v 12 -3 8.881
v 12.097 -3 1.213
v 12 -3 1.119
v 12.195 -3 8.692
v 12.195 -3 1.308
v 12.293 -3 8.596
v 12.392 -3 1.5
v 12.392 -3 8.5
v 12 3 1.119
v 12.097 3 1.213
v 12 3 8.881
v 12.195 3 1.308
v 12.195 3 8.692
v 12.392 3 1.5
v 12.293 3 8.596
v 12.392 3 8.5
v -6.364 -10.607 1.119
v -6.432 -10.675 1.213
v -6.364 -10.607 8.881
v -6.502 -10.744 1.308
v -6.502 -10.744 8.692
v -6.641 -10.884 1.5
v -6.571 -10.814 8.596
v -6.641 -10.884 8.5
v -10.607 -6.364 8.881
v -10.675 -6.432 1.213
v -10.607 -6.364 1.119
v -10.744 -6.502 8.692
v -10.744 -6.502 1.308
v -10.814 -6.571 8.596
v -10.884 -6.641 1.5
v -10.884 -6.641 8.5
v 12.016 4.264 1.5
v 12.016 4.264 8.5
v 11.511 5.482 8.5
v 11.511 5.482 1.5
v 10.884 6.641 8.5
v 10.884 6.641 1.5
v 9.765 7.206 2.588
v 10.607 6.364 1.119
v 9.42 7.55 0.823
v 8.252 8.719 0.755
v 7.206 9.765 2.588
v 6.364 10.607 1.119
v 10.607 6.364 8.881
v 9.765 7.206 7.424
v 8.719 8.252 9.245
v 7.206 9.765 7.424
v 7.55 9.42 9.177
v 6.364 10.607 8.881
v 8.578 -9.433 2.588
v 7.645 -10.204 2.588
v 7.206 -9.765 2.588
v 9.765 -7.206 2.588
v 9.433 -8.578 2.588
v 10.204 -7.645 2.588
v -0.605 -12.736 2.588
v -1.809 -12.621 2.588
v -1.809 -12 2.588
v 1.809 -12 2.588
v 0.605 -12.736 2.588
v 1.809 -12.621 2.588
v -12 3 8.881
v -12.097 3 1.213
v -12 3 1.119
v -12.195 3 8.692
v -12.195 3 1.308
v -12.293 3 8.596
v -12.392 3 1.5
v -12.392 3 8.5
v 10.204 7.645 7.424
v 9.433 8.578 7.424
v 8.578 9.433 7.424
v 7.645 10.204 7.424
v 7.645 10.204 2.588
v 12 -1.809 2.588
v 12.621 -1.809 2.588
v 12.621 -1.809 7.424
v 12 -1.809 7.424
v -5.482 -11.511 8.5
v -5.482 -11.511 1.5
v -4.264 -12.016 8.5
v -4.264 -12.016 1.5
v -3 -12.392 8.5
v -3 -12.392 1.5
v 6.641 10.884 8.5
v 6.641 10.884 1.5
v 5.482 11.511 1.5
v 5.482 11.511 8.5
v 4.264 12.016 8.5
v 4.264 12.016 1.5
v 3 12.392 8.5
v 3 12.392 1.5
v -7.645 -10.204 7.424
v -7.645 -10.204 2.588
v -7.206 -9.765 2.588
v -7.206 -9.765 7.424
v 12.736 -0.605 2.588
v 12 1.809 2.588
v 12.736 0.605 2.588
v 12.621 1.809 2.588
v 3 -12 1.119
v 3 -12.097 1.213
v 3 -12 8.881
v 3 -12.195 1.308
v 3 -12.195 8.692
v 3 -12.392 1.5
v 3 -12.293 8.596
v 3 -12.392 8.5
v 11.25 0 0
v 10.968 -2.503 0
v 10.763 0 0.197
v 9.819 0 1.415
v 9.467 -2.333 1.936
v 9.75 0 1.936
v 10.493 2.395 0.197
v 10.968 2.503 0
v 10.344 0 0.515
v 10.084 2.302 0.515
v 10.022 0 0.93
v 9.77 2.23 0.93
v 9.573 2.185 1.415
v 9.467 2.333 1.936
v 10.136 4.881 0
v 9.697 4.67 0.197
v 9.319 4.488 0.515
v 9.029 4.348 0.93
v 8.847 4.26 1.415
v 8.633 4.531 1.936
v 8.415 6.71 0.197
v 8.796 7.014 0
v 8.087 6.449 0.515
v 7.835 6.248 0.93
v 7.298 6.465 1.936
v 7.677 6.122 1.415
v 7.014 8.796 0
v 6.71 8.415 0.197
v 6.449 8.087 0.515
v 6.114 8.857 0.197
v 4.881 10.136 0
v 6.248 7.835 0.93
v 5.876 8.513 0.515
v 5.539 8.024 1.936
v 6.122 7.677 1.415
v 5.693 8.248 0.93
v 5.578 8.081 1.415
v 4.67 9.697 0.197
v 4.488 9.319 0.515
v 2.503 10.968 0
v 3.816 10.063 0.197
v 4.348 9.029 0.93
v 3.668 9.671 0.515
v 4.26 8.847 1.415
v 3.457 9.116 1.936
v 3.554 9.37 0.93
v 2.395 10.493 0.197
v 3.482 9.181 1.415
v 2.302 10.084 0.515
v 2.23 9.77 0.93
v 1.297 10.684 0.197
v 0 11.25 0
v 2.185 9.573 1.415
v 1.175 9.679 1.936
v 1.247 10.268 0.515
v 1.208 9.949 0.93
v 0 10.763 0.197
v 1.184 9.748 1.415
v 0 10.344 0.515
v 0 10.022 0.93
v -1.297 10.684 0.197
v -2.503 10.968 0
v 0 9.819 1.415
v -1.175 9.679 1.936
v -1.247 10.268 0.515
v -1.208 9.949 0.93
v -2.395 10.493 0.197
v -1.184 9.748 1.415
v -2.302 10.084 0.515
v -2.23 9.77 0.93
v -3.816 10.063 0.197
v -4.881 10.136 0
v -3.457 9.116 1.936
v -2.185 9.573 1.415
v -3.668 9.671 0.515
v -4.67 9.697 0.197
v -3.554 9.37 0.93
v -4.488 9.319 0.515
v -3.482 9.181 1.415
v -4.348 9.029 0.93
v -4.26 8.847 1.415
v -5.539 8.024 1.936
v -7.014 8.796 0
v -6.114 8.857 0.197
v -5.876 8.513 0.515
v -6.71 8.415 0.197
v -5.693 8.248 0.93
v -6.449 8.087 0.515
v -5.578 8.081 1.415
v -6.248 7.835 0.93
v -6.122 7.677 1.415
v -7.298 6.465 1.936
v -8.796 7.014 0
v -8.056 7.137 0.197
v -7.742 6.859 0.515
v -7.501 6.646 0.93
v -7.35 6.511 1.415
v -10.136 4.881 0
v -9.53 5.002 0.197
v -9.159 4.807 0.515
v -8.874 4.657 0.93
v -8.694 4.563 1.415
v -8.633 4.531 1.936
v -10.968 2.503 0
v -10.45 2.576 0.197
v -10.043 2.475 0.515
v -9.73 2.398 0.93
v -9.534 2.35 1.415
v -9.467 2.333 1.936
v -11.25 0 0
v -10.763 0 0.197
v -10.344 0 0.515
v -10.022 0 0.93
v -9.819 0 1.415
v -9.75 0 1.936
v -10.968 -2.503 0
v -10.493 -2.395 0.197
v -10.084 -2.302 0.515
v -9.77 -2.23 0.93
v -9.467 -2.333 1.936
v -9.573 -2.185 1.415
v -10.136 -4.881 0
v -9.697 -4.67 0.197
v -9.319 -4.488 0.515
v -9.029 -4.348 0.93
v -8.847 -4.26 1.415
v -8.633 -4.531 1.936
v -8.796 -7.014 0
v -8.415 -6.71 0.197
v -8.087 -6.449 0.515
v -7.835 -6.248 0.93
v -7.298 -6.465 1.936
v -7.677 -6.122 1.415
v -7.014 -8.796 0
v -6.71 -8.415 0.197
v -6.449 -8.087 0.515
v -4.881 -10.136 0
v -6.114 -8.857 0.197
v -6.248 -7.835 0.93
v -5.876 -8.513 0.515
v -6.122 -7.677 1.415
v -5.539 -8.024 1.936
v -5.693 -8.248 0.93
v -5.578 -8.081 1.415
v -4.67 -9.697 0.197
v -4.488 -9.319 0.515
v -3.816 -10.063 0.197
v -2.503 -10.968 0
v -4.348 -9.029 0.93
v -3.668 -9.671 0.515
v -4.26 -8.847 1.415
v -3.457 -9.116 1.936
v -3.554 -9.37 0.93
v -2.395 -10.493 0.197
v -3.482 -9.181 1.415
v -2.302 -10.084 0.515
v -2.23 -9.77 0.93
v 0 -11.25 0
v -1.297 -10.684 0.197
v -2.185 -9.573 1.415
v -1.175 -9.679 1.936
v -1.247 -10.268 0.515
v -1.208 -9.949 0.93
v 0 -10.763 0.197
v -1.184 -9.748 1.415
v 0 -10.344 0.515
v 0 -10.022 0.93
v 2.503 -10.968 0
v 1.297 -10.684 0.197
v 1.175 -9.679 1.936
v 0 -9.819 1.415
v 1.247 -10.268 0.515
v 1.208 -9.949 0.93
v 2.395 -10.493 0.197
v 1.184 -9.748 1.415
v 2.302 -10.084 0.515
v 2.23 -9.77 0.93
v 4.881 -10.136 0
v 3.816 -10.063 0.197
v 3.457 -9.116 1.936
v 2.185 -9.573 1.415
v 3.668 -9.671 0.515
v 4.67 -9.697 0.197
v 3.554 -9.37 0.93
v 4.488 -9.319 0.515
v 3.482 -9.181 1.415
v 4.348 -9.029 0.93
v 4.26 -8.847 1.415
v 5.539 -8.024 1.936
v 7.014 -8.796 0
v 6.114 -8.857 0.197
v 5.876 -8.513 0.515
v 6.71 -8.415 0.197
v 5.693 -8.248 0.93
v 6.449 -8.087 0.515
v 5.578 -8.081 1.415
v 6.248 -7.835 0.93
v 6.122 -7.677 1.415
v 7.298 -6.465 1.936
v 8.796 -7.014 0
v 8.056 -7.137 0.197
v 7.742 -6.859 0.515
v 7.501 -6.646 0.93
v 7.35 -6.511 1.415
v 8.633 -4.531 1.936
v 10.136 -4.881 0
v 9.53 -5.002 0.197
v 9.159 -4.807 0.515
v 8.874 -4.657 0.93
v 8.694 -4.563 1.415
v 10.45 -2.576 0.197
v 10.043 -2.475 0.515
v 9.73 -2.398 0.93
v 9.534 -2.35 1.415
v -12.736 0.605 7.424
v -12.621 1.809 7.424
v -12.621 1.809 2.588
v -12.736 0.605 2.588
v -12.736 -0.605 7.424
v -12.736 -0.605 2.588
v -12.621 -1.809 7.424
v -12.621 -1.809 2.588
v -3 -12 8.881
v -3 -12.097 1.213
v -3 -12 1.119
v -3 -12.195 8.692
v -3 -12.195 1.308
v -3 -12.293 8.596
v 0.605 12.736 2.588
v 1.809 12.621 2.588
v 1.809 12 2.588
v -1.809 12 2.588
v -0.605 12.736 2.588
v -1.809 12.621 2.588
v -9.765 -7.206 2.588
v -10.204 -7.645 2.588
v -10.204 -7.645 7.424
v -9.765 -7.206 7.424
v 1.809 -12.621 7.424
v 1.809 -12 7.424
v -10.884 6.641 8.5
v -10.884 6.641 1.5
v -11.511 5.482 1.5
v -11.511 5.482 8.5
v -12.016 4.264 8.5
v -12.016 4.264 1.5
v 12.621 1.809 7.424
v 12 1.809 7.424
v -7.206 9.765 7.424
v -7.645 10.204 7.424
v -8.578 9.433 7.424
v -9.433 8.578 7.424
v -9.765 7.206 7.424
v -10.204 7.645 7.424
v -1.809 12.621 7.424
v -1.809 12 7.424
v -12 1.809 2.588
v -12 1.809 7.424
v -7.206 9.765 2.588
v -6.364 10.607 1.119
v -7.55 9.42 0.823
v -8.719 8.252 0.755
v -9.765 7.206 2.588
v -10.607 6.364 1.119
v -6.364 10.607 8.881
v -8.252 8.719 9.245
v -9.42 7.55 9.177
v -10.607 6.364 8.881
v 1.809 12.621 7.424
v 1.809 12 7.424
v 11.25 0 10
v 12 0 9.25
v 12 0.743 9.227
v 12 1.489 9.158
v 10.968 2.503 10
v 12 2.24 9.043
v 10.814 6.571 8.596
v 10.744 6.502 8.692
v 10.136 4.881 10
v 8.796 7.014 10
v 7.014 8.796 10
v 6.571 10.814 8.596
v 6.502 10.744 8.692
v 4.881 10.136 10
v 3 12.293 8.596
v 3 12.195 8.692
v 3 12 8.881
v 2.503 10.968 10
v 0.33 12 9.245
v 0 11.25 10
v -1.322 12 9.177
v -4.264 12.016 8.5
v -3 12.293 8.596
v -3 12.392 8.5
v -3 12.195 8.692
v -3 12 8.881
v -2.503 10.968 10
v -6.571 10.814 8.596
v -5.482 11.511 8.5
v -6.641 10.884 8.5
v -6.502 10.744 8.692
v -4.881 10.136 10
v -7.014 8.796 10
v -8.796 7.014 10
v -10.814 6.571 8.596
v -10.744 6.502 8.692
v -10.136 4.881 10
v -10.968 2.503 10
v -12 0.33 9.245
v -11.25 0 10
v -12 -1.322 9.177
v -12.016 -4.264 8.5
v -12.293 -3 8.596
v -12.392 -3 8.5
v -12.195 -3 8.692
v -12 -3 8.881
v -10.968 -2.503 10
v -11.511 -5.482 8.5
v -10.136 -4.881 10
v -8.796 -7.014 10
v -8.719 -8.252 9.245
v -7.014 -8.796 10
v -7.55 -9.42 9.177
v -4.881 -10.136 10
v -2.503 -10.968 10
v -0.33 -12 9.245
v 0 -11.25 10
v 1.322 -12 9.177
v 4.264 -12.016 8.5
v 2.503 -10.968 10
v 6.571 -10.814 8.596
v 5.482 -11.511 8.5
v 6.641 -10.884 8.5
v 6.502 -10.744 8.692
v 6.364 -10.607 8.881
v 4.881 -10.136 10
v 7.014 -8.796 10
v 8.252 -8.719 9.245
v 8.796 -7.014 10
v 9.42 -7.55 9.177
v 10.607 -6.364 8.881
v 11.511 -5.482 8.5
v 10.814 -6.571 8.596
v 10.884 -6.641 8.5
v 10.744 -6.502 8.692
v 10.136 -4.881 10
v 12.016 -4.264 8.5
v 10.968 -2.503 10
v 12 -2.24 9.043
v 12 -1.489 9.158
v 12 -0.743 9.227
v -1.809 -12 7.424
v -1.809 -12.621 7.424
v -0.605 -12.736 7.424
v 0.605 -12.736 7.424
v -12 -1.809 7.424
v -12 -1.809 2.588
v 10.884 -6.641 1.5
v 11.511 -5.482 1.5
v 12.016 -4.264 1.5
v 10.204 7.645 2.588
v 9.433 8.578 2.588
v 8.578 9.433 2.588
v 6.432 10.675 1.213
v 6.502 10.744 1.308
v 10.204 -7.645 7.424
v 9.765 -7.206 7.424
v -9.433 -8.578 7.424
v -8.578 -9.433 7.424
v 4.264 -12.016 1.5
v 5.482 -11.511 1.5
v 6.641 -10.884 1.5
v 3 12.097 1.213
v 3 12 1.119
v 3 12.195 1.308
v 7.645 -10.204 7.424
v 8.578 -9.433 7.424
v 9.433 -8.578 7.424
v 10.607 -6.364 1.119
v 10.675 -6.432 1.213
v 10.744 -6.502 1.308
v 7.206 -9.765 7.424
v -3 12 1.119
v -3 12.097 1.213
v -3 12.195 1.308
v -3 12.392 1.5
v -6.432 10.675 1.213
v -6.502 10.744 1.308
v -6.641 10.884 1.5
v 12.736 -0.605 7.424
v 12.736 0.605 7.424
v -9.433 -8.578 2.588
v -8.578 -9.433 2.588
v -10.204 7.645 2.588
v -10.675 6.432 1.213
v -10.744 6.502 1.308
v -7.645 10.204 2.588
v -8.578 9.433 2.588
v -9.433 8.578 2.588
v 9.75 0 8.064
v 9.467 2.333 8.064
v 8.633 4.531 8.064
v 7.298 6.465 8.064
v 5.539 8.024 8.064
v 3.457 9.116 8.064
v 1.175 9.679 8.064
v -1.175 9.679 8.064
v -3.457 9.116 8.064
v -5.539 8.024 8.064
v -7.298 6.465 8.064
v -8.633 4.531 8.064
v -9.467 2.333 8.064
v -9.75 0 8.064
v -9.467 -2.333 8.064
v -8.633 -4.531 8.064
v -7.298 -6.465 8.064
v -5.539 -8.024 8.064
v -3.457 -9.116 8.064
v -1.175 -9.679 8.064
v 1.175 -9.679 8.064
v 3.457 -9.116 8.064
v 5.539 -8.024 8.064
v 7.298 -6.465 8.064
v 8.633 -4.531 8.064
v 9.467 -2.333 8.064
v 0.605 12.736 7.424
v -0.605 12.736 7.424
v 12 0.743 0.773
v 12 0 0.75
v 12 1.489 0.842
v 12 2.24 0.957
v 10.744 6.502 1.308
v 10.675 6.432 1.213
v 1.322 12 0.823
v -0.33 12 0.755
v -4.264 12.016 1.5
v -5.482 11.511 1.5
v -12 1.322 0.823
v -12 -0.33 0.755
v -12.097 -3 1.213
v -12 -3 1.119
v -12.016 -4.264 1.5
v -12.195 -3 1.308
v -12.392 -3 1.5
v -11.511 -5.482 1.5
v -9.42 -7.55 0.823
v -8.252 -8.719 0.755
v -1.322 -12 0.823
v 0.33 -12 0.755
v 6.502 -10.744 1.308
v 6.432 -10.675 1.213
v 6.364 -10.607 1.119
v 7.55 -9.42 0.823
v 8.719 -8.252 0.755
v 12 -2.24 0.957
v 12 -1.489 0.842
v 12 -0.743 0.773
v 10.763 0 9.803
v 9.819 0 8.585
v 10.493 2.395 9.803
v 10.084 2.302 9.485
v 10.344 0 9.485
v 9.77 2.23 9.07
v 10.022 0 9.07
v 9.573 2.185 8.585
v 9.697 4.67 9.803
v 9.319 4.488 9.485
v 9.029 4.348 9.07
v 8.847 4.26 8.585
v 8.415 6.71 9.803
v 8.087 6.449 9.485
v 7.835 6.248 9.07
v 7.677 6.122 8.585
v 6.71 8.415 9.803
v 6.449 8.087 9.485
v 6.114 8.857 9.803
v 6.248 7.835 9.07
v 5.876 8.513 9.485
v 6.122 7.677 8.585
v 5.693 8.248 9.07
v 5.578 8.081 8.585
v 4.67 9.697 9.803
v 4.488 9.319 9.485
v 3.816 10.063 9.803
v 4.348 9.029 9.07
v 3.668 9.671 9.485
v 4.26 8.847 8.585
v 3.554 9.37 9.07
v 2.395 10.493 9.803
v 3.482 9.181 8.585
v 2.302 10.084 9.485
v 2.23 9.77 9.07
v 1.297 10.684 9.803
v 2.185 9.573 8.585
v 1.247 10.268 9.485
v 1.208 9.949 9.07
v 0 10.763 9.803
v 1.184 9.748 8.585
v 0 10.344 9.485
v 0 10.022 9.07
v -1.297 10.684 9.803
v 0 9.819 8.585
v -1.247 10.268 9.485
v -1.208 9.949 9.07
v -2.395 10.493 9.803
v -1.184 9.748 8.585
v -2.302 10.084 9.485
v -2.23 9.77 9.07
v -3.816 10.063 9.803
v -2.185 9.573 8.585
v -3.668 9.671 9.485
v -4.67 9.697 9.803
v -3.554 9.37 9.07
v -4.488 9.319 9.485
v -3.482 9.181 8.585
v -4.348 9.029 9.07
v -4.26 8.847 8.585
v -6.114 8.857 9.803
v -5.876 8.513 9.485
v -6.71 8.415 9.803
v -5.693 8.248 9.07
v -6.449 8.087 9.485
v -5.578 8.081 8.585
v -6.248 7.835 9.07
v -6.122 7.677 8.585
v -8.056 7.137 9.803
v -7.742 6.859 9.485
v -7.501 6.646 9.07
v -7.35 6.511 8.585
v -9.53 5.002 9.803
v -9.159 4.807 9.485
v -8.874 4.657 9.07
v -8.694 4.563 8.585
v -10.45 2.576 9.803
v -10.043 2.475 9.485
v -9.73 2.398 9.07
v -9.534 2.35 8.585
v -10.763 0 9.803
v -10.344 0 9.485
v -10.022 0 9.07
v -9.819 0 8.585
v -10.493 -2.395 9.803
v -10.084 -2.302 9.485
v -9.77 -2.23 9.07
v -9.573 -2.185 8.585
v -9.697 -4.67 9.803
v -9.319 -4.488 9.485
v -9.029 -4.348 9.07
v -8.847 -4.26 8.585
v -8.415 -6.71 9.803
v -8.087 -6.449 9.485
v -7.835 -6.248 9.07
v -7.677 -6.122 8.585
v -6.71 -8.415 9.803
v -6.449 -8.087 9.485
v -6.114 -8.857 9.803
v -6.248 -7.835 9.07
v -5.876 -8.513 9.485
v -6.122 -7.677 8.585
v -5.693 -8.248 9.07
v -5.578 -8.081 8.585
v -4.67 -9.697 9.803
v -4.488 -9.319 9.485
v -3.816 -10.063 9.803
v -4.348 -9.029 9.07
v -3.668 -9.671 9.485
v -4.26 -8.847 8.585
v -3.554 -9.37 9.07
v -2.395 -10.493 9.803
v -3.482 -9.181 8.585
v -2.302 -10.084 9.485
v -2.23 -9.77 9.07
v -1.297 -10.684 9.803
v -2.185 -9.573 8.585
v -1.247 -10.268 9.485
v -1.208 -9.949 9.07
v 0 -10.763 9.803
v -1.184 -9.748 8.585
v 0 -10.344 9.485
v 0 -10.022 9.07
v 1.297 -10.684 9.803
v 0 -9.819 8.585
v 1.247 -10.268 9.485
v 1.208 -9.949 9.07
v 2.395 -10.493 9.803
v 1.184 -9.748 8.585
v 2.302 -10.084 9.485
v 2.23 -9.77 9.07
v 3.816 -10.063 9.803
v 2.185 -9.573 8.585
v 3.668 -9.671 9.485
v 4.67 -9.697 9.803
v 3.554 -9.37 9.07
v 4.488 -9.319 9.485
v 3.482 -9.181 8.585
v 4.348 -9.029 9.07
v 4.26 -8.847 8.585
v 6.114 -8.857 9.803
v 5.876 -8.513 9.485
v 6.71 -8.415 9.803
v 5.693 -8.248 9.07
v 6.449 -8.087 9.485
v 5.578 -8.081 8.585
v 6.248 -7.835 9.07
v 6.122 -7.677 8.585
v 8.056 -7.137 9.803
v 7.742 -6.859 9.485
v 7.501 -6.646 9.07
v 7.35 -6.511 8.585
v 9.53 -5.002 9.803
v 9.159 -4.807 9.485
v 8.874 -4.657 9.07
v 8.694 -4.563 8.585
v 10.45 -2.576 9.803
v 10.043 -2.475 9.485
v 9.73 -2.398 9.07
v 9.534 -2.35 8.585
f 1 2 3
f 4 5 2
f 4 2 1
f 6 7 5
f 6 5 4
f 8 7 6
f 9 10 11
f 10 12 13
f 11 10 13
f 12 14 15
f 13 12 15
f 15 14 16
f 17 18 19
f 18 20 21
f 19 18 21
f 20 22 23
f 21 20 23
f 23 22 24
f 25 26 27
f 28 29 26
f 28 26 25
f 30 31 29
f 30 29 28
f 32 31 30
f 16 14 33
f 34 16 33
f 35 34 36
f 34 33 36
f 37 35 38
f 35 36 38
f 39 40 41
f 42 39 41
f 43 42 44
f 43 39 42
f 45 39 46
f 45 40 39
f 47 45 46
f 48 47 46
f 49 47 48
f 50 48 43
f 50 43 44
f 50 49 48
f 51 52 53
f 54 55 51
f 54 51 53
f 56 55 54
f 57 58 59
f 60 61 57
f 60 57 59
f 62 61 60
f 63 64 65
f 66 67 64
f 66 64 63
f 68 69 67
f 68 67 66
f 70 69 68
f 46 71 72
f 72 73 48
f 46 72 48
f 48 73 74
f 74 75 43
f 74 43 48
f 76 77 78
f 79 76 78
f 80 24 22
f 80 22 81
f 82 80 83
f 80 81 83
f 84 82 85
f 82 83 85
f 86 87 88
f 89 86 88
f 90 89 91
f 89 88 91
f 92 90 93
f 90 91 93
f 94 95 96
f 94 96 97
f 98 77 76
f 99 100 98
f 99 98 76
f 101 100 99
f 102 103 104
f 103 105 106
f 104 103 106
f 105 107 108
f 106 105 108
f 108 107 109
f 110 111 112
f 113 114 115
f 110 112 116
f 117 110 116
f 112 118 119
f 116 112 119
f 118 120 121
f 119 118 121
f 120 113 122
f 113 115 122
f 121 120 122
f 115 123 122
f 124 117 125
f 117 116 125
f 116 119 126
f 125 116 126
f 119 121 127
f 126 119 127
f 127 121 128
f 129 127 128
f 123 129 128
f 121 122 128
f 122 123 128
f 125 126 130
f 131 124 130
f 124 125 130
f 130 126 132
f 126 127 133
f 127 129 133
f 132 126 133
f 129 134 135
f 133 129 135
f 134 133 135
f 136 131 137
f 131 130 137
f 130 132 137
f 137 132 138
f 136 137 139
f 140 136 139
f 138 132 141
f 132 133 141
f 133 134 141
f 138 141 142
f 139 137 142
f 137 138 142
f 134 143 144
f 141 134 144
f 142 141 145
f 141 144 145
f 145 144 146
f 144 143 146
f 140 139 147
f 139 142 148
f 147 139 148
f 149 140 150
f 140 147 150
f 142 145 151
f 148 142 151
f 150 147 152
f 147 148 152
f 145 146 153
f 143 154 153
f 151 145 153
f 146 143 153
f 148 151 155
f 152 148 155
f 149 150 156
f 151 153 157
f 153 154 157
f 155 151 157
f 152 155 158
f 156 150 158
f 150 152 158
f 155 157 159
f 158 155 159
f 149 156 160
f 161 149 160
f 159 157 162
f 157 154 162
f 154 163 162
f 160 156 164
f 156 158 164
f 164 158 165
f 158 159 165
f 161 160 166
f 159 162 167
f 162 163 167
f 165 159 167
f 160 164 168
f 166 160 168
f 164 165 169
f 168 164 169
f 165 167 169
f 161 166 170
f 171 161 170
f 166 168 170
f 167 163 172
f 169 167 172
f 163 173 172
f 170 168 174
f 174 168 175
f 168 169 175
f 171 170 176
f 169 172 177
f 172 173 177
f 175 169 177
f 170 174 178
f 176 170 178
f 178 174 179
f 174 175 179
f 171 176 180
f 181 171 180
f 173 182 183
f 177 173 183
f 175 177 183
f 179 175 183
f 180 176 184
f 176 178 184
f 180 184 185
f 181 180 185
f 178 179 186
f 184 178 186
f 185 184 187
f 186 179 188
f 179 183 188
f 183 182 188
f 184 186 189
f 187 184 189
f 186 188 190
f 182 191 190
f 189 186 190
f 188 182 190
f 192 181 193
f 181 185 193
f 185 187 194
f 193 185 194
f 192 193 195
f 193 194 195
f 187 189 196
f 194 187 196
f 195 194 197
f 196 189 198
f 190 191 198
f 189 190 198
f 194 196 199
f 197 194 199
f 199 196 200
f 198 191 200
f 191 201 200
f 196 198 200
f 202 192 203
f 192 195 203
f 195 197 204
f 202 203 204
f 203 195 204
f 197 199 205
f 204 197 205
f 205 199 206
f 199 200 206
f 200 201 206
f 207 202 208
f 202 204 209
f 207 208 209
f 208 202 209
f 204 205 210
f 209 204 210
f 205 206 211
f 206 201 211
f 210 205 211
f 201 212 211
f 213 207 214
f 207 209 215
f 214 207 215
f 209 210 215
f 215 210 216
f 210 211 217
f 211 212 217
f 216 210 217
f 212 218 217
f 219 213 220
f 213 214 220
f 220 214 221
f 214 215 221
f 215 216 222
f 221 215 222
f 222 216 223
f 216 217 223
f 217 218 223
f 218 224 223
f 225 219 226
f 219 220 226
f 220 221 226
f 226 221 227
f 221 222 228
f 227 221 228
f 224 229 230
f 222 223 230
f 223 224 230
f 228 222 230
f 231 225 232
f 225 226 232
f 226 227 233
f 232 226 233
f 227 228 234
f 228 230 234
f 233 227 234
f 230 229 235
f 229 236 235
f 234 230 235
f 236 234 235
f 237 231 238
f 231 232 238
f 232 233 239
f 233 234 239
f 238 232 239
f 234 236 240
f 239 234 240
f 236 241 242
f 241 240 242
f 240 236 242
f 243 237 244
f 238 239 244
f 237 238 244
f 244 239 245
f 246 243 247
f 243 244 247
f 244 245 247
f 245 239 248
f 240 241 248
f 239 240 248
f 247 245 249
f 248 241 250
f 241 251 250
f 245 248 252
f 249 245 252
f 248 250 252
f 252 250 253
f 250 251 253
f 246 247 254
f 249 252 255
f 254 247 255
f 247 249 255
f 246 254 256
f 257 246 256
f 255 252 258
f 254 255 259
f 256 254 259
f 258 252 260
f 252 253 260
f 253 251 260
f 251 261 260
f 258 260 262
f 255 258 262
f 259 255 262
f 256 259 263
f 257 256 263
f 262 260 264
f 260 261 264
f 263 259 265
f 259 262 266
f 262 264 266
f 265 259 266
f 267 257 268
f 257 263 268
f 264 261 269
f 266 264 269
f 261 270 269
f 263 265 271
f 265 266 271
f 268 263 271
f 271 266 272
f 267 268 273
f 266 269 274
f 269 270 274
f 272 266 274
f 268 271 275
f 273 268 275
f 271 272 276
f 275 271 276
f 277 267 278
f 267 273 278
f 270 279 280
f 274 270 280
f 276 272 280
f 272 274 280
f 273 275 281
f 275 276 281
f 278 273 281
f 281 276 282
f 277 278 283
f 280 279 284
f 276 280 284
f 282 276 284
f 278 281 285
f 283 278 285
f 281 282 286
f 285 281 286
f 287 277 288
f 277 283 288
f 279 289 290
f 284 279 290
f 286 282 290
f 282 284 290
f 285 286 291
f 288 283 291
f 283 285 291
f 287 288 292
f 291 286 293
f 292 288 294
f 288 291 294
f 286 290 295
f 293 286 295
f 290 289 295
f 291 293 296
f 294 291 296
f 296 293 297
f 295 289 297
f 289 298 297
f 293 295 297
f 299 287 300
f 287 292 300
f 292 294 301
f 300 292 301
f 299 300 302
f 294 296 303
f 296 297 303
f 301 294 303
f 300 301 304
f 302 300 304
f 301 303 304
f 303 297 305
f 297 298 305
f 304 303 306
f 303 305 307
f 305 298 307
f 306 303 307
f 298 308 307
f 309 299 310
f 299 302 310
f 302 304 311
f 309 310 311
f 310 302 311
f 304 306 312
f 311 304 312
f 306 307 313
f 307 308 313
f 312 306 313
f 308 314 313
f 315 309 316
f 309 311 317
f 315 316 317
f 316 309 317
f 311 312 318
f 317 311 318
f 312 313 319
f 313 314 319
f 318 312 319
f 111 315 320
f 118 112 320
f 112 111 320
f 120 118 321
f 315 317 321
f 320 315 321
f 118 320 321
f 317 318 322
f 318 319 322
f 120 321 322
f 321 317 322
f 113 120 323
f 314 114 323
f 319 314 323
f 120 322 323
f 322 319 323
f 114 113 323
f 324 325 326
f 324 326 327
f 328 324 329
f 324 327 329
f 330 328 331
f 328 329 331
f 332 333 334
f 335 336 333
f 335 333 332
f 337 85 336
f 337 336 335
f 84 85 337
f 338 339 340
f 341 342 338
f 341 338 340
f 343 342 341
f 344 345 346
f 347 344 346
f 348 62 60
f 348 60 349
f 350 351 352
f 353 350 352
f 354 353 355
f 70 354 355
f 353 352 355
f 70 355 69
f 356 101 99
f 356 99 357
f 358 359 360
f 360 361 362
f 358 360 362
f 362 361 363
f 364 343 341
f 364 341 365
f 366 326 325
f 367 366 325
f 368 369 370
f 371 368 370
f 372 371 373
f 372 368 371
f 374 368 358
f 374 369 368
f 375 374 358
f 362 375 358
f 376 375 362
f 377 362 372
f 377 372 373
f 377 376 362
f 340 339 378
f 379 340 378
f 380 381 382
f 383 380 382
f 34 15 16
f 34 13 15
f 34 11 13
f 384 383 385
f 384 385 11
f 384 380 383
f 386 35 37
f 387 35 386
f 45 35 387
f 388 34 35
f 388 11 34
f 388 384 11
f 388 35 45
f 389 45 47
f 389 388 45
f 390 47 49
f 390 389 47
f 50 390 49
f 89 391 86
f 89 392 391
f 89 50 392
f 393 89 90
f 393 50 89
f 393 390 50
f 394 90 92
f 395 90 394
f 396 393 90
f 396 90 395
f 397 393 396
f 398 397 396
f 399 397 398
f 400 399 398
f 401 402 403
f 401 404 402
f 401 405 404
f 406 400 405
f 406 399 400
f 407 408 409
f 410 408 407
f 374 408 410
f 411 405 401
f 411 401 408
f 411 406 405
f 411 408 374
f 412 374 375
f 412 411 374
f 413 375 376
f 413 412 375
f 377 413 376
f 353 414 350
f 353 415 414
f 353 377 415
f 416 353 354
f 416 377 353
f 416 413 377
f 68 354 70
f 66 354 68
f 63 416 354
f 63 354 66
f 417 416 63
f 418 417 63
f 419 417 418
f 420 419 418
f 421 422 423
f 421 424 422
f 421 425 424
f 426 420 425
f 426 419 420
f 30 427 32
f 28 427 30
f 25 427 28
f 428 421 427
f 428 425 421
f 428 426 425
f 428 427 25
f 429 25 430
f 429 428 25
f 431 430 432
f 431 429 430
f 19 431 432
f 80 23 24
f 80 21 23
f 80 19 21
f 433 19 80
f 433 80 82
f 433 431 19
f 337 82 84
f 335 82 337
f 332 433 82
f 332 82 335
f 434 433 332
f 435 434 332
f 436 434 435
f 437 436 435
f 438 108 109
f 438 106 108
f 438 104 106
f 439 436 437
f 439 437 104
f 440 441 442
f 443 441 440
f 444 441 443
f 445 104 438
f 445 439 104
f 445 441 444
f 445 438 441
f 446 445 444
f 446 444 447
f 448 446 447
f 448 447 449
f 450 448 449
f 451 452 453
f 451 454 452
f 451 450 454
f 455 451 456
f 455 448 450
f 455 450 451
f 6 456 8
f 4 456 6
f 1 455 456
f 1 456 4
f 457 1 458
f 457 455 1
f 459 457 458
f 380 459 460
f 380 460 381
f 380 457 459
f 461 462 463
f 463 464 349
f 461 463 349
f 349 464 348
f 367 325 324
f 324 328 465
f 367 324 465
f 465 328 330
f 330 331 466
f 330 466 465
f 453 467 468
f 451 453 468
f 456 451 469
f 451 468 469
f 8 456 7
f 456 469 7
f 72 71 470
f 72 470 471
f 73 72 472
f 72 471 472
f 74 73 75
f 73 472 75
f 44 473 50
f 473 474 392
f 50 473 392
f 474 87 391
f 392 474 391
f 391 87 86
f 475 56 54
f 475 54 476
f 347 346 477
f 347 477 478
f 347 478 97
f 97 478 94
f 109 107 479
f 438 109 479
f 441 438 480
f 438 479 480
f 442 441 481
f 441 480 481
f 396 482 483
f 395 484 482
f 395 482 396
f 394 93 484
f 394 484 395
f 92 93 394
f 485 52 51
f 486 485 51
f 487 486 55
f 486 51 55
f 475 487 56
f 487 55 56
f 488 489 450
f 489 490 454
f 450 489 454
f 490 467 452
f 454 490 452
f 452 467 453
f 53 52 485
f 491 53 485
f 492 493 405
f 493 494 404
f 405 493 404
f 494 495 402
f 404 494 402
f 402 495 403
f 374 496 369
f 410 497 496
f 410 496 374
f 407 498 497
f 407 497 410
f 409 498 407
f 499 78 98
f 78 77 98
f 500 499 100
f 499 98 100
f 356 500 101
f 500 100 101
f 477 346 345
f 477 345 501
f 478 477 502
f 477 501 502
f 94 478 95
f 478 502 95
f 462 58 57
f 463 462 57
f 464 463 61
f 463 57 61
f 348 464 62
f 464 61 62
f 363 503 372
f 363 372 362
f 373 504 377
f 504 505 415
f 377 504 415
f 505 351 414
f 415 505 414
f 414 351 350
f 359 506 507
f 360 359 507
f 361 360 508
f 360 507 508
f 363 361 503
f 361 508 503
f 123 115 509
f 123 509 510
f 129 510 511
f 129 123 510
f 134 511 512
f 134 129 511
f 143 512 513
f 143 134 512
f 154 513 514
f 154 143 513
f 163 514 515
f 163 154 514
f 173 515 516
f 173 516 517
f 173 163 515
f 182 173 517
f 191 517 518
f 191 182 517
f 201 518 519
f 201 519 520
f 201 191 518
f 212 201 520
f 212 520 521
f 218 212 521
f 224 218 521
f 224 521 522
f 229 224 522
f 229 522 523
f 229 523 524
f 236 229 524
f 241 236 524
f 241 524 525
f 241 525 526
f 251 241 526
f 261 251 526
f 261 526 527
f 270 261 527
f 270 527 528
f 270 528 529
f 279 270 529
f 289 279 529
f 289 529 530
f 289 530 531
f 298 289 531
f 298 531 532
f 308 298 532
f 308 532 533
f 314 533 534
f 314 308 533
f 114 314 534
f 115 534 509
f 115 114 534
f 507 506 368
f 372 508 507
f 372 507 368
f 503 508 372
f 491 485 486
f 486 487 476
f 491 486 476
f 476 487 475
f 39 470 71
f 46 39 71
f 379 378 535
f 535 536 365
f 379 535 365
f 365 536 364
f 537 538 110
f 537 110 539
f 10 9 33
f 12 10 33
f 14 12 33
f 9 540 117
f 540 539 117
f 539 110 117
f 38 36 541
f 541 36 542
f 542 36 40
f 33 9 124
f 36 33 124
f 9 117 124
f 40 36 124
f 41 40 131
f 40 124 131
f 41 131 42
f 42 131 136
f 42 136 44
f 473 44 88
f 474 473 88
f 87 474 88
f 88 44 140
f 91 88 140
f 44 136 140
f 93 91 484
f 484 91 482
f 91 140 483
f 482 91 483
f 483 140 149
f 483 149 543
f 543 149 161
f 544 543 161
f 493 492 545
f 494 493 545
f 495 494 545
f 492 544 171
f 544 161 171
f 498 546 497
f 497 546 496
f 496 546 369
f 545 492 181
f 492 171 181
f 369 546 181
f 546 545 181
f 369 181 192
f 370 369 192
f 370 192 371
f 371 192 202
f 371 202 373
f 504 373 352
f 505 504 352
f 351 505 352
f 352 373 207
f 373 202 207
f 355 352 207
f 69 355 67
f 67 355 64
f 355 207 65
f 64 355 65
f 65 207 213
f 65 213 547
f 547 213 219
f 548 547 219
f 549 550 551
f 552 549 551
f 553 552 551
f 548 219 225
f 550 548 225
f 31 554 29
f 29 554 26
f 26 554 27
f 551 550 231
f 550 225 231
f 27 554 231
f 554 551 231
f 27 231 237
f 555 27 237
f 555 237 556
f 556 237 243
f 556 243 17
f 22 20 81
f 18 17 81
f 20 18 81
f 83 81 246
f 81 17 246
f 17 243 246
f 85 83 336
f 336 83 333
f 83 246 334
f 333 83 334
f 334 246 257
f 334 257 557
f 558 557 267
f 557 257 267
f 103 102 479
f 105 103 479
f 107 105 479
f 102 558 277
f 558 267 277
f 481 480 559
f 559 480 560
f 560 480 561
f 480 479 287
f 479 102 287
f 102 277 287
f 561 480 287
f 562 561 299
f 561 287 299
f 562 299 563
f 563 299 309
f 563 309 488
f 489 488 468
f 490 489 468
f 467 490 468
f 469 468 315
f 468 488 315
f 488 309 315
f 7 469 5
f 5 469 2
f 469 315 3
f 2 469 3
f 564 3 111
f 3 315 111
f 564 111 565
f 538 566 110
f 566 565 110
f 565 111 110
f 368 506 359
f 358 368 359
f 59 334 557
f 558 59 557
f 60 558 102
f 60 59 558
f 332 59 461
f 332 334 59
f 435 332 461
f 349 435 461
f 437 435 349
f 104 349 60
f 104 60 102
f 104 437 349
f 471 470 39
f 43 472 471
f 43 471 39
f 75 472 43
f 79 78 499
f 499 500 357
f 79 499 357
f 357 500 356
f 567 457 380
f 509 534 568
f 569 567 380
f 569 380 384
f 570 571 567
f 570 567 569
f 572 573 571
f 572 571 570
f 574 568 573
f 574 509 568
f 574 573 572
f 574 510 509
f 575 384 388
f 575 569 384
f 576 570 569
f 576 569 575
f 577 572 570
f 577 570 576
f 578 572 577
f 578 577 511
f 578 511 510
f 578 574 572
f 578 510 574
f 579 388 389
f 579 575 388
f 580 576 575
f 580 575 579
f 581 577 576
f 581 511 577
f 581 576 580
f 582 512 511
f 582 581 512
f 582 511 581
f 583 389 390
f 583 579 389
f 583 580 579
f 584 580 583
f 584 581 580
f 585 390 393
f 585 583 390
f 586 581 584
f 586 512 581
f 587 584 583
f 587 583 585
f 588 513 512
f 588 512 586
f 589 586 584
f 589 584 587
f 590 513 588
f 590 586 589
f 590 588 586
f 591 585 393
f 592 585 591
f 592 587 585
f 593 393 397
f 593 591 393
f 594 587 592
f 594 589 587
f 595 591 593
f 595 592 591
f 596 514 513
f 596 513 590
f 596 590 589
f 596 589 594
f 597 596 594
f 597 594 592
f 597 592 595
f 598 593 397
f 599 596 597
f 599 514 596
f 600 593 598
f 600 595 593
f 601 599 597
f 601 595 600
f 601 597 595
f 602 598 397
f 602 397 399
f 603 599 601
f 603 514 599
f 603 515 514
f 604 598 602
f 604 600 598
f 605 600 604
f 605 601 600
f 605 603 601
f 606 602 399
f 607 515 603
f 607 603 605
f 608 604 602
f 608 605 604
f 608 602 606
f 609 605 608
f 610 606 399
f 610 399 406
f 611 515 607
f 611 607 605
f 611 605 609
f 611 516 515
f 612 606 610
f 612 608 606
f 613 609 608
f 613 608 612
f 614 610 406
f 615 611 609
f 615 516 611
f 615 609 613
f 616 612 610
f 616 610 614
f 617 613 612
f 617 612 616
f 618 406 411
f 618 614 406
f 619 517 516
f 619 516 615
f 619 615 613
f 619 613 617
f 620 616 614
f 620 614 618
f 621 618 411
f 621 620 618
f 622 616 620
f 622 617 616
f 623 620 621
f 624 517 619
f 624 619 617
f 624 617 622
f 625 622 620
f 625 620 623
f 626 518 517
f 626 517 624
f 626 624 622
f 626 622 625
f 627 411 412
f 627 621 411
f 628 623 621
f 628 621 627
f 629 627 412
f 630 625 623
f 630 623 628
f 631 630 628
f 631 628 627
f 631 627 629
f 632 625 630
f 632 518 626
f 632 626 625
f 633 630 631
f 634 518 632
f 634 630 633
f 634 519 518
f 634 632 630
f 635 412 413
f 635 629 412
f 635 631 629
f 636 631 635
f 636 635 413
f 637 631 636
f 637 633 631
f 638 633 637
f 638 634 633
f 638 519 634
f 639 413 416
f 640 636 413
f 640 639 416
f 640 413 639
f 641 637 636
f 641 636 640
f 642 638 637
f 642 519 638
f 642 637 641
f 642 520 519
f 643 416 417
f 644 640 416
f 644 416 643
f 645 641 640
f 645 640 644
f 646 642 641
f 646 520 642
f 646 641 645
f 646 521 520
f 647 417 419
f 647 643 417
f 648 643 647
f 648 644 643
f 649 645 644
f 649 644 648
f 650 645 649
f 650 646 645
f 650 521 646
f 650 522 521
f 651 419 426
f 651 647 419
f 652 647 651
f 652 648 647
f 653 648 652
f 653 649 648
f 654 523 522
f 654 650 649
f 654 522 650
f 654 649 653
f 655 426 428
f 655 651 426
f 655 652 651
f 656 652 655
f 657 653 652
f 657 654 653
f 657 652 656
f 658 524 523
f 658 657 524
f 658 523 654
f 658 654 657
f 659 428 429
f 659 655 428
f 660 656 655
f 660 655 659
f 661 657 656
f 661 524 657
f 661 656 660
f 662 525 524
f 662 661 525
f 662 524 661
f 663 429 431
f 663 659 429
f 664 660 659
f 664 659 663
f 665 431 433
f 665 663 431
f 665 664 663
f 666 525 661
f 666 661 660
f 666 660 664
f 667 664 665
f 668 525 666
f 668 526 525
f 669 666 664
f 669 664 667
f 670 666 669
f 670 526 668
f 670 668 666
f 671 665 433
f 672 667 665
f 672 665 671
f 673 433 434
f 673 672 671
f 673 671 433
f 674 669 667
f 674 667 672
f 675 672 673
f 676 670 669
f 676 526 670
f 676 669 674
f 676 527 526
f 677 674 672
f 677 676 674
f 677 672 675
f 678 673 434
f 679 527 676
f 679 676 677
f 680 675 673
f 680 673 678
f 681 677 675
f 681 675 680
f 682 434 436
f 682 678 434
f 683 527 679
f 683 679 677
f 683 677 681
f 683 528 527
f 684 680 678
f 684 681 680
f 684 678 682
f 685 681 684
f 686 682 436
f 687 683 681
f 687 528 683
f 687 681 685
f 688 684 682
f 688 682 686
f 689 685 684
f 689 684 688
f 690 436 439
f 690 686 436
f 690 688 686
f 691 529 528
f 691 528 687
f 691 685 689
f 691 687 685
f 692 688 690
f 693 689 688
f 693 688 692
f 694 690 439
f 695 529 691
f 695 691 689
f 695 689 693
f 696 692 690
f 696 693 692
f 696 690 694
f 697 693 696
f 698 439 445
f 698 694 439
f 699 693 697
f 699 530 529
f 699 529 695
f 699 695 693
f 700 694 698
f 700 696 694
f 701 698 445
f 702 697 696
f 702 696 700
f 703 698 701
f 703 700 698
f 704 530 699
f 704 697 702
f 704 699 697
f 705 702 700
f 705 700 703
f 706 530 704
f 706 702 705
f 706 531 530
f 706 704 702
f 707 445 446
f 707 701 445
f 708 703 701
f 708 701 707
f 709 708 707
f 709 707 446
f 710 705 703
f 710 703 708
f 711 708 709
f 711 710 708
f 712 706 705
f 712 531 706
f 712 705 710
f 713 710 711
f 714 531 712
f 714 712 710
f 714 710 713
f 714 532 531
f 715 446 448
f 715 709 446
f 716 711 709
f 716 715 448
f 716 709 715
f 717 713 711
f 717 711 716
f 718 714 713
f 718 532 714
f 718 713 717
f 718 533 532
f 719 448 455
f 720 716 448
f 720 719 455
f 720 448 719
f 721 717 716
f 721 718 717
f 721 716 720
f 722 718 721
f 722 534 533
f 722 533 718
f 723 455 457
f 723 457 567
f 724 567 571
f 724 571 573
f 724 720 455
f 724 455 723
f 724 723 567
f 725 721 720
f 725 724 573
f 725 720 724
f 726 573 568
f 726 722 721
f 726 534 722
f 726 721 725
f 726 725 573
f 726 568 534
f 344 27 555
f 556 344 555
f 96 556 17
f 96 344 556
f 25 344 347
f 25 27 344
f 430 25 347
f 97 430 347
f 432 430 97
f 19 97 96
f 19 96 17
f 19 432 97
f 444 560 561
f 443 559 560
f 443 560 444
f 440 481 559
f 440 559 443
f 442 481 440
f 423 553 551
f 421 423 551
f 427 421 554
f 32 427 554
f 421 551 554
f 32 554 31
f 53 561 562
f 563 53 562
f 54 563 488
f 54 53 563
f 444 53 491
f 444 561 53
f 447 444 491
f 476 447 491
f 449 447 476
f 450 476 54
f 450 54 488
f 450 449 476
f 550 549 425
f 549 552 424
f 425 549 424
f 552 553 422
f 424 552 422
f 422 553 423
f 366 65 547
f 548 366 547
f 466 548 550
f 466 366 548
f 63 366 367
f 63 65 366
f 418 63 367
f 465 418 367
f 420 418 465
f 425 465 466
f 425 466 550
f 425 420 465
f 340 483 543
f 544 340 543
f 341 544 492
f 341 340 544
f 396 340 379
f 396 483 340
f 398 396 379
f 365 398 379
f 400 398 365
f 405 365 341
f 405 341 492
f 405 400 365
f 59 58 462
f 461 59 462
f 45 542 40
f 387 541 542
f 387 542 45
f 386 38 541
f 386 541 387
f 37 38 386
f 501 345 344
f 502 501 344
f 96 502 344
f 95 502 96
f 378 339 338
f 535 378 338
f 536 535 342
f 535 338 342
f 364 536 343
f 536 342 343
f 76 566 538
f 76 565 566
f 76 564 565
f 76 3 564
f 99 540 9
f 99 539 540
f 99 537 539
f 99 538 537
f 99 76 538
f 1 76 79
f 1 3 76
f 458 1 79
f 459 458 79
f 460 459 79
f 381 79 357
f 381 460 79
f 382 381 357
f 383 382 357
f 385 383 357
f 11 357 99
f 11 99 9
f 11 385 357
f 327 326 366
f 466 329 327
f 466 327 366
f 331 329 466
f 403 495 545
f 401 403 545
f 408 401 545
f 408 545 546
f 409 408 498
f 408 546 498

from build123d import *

# Parameters (mm, degrees)
F0_R            = 12.75
F0_R_2          = 9.75
F1_DEPTH        = 10
F2_SIZE         = 1.5
F4_W            = 6
F4_H            = 10
F4_W_2          = 3.618944902
F4_H_2          = 4.83566802
F5_DEPTH        = 2
F5_COPIES_COUNT = 8


# Not quite as in the source:
# - a fillet or chamfer that OpenCascade refuses, or shapes differently, is made with other operations: its cross-section is extruded or revolved along the edge and cut away or added
# - a pattern or mirror of a feature is missing from the dataset's text; its kind, count and spacing are read off the source's solid


with BuildPart() as f1:
    # F0 (on Top) → F1 (new body)
    with BuildSketch(Plane.XY):
        Circle(F0_R)
        Circle(F0_R_2, mode=Mode.SUBTRACT)
    extrude(amount=F1_DEPTH)

    # F2
    f2_edges = [f1.edges().sort_by_distance(p)[0] for p in [
        (-12.75, 0, 10),
        (-12.75, 0, 0),
    ]]
    chamfer(f2_edges, length=F2_SIZE)

    # F4 (on offset) → F5 (cut)
    with BuildSketch(Plane.YZ.offset(14)):
        with Locations((0, 5.0058439374)):
            Rectangle(F4_W, F4_H)
        with Locations((0, 5.0058439374)):
            Rectangle(F4_W_2, F4_H_2, mode=Mode.SUBTRACT)
    f5 = extrude(amount=-F5_DEPTH, mode=Mode.SUBTRACT)

    # F5_copies: F5 ×8 about axis
    f5_copies_axis = Axis((0, 0, 0), (0, 0, 1))
    for i in range(1, F5_COPIES_COUNT):
        add(f5.rotate(f5_copies_axis, i * 360 / F5_COPIES_COUNT), mode=Mode.SUBTRACT)

    # F6: fillet of radius 2 on 2 edges, made by hand

    # F6_s1 → F6_t2 (revolve, cut)
    with BuildSketch(Plane.XZ):
        with BuildLine():
            ThreePointArc((11.25, 10), (10.1688611699, 9.2882531983), (9.75, 8.0635083269))
            Line((9.75, 8.0635083269), (9.75, 10))
            Line((9.75, 10), (11.25, 10))
        make_face()
    revolve(axis=Axis((0, 0, 10), (0, 0, 1)), mode=Mode.SUBTRACT)

    # F6_s3 → F6_t4 (revolve, cut)
    with BuildSketch(Plane.XZ):
        with BuildLine():
            ThreePointArc((11.25, 0), (10.1688611699, 0.7117468017), (9.75, 1.9364916731))
            Line((9.75, 1.9364916731), (9.75, 0))
            Line((9.75, 0), (11.25, 0))
        make_face()
    revolve(axis=Axis((0, 0, 0), (0, 0, 1)), mode=Mode.SUBTRACT)


solid = f1.part
